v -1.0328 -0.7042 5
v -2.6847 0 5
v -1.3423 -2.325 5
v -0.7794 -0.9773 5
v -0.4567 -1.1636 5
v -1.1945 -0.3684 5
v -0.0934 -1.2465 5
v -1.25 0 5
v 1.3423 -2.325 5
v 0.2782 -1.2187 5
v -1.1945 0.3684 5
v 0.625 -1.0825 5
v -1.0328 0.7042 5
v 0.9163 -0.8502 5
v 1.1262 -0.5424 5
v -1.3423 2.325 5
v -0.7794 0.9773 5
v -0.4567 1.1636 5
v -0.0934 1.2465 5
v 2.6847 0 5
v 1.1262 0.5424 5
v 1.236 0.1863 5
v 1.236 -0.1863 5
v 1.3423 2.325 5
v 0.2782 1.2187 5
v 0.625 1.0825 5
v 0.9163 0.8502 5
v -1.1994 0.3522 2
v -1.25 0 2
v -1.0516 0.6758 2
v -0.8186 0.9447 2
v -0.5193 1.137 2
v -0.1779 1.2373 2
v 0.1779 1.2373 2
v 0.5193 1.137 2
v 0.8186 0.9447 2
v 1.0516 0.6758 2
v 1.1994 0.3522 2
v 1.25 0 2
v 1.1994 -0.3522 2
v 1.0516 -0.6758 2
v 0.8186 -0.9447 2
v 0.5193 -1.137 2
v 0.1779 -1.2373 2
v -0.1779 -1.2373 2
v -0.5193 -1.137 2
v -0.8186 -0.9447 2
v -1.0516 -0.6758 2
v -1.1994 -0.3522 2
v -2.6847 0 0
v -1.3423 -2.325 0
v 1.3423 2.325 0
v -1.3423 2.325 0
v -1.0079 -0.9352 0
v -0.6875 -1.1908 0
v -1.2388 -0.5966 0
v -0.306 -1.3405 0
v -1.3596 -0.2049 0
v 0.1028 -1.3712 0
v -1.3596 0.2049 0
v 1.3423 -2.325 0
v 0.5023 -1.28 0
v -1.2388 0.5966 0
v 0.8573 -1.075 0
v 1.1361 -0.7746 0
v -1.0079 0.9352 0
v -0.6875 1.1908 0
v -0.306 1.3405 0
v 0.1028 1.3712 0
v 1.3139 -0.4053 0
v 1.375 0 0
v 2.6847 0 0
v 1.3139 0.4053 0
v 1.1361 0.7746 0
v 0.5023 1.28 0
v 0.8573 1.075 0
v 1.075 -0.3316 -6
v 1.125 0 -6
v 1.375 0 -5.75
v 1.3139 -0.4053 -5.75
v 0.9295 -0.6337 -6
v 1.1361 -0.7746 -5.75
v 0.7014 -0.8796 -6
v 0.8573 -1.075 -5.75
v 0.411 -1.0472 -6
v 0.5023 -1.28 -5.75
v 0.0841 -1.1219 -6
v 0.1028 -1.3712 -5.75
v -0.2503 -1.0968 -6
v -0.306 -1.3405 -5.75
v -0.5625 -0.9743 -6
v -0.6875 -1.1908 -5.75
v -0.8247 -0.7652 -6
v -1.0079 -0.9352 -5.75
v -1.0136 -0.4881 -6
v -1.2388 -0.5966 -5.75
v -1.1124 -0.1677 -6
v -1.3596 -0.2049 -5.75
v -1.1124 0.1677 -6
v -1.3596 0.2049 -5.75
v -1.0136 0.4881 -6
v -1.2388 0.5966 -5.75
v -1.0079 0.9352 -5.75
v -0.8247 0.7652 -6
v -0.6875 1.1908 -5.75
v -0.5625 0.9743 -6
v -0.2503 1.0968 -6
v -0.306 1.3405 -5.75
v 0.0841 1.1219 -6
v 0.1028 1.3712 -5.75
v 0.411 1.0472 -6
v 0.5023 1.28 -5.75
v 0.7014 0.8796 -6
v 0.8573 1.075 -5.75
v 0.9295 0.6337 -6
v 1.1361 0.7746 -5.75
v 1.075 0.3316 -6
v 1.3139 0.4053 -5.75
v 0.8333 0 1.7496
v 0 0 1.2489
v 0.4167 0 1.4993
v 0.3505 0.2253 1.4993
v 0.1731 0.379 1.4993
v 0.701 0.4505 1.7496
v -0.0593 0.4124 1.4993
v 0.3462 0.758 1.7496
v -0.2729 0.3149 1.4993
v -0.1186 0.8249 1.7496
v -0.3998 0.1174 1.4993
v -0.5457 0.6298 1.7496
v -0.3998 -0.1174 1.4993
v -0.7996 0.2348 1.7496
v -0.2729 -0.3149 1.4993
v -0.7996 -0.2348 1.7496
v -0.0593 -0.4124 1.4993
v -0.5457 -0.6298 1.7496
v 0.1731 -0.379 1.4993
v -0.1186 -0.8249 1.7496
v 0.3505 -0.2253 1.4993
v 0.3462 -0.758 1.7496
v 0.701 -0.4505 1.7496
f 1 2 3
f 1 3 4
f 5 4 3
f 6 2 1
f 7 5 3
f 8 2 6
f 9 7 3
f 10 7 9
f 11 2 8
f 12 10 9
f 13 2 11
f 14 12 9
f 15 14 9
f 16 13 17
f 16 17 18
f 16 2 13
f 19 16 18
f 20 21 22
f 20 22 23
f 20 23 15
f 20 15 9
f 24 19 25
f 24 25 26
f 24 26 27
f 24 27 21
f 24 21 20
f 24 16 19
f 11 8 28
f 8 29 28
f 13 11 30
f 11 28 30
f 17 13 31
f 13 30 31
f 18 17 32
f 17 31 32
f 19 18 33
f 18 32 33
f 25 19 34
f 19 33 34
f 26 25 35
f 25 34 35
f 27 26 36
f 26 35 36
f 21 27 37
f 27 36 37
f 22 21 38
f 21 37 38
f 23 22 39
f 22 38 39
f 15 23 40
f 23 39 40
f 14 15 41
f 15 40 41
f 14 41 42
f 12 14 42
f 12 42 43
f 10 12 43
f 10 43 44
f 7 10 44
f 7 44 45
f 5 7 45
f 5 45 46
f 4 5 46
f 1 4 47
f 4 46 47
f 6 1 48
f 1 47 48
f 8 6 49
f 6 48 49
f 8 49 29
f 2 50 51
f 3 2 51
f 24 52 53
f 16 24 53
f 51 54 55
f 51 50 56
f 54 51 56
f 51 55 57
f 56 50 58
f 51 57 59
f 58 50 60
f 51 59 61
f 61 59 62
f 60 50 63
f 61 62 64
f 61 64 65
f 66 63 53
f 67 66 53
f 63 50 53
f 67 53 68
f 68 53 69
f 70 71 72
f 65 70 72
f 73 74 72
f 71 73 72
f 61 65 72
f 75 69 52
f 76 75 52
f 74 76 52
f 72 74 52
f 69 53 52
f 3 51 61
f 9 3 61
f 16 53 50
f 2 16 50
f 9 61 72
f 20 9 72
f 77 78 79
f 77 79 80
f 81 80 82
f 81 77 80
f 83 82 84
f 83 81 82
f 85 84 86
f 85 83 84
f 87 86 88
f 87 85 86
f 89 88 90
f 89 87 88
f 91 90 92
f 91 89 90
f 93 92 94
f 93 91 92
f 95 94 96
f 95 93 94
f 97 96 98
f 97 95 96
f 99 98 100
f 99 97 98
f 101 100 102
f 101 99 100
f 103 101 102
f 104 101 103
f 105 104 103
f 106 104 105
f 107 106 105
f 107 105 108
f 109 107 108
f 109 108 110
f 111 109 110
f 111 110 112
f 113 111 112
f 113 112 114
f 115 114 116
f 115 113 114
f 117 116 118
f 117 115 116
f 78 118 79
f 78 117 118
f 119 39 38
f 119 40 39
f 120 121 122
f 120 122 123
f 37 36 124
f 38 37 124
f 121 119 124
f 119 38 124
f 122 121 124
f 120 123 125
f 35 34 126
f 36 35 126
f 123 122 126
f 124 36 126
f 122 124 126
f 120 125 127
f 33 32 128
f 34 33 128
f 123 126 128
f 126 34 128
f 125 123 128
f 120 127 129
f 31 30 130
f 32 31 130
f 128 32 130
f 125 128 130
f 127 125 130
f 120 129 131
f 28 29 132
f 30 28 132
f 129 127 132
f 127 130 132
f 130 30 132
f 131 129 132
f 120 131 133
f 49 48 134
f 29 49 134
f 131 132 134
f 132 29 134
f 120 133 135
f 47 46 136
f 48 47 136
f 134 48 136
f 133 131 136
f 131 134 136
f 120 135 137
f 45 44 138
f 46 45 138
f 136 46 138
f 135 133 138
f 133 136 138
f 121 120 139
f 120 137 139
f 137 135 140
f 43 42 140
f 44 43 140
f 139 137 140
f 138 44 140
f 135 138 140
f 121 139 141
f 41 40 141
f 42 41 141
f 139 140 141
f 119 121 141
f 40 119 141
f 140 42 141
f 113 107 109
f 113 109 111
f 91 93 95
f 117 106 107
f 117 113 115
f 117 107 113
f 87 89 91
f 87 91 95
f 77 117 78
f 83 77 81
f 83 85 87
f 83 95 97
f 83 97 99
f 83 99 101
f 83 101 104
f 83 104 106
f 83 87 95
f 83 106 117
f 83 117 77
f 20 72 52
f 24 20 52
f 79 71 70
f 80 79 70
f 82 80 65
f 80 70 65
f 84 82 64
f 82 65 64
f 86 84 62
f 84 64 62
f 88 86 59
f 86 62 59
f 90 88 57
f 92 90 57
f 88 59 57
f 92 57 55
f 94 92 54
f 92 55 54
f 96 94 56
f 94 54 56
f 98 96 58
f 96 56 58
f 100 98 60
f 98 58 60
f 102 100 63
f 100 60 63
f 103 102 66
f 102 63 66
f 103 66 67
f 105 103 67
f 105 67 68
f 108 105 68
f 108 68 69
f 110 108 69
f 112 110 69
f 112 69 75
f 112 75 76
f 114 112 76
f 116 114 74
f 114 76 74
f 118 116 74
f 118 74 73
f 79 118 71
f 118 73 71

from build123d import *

# Parameters (mm, degrees)
F1_DEPTH = 5
F3_D     = 2.5
F3_DEPTH = 3
F3_TIP   = 0.7510757738
F4_R     = 1.375
F5_DEPTH = 6
F6_SIZE  = 0.25


with BuildPart() as f1:
    # F0 (on Top) → F1 (new body)
    with BuildSketch(Plane.XY):
        Polygon((1.3423393759, 2.325), (-1.3423393759, 2.325), (-2.6846787517, 0), (-1.3423393759, -2.325), (1.3423393759, -2.325), (2.6846787517, 0), align=None)
    extrude(amount=F1_DEPTH)

    # F3
    with Locations(Plane.XY.offset(5)):
        with Locations((0, 0)):
            Hole(F3_D / 2, depth=F3_DEPTH)
            with Locations((0, 0, -(F3_DEPTH + F3_TIP / 2))):  # 118° drill point
                Cone(0, F3_D / 2, F3_TIP, mode=Mode.SUBTRACT)

    # F4 (on face) → F5 (join)
    with BuildSketch(Plane(origin=(0, 0, 0), x_dir=(1, 0, 0), z_dir=(0, 0, -1))):
        Circle(F4_R)
    extrude(amount=F5_DEPTH)

    # F6
    f6_edges = [f1.edges().sort_by_distance(p)[0] for p in [
        (-1.375, 0, -6),
    ]]
    chamfer(f6_edges, length=F6_SIZE)


solid = f1.part
